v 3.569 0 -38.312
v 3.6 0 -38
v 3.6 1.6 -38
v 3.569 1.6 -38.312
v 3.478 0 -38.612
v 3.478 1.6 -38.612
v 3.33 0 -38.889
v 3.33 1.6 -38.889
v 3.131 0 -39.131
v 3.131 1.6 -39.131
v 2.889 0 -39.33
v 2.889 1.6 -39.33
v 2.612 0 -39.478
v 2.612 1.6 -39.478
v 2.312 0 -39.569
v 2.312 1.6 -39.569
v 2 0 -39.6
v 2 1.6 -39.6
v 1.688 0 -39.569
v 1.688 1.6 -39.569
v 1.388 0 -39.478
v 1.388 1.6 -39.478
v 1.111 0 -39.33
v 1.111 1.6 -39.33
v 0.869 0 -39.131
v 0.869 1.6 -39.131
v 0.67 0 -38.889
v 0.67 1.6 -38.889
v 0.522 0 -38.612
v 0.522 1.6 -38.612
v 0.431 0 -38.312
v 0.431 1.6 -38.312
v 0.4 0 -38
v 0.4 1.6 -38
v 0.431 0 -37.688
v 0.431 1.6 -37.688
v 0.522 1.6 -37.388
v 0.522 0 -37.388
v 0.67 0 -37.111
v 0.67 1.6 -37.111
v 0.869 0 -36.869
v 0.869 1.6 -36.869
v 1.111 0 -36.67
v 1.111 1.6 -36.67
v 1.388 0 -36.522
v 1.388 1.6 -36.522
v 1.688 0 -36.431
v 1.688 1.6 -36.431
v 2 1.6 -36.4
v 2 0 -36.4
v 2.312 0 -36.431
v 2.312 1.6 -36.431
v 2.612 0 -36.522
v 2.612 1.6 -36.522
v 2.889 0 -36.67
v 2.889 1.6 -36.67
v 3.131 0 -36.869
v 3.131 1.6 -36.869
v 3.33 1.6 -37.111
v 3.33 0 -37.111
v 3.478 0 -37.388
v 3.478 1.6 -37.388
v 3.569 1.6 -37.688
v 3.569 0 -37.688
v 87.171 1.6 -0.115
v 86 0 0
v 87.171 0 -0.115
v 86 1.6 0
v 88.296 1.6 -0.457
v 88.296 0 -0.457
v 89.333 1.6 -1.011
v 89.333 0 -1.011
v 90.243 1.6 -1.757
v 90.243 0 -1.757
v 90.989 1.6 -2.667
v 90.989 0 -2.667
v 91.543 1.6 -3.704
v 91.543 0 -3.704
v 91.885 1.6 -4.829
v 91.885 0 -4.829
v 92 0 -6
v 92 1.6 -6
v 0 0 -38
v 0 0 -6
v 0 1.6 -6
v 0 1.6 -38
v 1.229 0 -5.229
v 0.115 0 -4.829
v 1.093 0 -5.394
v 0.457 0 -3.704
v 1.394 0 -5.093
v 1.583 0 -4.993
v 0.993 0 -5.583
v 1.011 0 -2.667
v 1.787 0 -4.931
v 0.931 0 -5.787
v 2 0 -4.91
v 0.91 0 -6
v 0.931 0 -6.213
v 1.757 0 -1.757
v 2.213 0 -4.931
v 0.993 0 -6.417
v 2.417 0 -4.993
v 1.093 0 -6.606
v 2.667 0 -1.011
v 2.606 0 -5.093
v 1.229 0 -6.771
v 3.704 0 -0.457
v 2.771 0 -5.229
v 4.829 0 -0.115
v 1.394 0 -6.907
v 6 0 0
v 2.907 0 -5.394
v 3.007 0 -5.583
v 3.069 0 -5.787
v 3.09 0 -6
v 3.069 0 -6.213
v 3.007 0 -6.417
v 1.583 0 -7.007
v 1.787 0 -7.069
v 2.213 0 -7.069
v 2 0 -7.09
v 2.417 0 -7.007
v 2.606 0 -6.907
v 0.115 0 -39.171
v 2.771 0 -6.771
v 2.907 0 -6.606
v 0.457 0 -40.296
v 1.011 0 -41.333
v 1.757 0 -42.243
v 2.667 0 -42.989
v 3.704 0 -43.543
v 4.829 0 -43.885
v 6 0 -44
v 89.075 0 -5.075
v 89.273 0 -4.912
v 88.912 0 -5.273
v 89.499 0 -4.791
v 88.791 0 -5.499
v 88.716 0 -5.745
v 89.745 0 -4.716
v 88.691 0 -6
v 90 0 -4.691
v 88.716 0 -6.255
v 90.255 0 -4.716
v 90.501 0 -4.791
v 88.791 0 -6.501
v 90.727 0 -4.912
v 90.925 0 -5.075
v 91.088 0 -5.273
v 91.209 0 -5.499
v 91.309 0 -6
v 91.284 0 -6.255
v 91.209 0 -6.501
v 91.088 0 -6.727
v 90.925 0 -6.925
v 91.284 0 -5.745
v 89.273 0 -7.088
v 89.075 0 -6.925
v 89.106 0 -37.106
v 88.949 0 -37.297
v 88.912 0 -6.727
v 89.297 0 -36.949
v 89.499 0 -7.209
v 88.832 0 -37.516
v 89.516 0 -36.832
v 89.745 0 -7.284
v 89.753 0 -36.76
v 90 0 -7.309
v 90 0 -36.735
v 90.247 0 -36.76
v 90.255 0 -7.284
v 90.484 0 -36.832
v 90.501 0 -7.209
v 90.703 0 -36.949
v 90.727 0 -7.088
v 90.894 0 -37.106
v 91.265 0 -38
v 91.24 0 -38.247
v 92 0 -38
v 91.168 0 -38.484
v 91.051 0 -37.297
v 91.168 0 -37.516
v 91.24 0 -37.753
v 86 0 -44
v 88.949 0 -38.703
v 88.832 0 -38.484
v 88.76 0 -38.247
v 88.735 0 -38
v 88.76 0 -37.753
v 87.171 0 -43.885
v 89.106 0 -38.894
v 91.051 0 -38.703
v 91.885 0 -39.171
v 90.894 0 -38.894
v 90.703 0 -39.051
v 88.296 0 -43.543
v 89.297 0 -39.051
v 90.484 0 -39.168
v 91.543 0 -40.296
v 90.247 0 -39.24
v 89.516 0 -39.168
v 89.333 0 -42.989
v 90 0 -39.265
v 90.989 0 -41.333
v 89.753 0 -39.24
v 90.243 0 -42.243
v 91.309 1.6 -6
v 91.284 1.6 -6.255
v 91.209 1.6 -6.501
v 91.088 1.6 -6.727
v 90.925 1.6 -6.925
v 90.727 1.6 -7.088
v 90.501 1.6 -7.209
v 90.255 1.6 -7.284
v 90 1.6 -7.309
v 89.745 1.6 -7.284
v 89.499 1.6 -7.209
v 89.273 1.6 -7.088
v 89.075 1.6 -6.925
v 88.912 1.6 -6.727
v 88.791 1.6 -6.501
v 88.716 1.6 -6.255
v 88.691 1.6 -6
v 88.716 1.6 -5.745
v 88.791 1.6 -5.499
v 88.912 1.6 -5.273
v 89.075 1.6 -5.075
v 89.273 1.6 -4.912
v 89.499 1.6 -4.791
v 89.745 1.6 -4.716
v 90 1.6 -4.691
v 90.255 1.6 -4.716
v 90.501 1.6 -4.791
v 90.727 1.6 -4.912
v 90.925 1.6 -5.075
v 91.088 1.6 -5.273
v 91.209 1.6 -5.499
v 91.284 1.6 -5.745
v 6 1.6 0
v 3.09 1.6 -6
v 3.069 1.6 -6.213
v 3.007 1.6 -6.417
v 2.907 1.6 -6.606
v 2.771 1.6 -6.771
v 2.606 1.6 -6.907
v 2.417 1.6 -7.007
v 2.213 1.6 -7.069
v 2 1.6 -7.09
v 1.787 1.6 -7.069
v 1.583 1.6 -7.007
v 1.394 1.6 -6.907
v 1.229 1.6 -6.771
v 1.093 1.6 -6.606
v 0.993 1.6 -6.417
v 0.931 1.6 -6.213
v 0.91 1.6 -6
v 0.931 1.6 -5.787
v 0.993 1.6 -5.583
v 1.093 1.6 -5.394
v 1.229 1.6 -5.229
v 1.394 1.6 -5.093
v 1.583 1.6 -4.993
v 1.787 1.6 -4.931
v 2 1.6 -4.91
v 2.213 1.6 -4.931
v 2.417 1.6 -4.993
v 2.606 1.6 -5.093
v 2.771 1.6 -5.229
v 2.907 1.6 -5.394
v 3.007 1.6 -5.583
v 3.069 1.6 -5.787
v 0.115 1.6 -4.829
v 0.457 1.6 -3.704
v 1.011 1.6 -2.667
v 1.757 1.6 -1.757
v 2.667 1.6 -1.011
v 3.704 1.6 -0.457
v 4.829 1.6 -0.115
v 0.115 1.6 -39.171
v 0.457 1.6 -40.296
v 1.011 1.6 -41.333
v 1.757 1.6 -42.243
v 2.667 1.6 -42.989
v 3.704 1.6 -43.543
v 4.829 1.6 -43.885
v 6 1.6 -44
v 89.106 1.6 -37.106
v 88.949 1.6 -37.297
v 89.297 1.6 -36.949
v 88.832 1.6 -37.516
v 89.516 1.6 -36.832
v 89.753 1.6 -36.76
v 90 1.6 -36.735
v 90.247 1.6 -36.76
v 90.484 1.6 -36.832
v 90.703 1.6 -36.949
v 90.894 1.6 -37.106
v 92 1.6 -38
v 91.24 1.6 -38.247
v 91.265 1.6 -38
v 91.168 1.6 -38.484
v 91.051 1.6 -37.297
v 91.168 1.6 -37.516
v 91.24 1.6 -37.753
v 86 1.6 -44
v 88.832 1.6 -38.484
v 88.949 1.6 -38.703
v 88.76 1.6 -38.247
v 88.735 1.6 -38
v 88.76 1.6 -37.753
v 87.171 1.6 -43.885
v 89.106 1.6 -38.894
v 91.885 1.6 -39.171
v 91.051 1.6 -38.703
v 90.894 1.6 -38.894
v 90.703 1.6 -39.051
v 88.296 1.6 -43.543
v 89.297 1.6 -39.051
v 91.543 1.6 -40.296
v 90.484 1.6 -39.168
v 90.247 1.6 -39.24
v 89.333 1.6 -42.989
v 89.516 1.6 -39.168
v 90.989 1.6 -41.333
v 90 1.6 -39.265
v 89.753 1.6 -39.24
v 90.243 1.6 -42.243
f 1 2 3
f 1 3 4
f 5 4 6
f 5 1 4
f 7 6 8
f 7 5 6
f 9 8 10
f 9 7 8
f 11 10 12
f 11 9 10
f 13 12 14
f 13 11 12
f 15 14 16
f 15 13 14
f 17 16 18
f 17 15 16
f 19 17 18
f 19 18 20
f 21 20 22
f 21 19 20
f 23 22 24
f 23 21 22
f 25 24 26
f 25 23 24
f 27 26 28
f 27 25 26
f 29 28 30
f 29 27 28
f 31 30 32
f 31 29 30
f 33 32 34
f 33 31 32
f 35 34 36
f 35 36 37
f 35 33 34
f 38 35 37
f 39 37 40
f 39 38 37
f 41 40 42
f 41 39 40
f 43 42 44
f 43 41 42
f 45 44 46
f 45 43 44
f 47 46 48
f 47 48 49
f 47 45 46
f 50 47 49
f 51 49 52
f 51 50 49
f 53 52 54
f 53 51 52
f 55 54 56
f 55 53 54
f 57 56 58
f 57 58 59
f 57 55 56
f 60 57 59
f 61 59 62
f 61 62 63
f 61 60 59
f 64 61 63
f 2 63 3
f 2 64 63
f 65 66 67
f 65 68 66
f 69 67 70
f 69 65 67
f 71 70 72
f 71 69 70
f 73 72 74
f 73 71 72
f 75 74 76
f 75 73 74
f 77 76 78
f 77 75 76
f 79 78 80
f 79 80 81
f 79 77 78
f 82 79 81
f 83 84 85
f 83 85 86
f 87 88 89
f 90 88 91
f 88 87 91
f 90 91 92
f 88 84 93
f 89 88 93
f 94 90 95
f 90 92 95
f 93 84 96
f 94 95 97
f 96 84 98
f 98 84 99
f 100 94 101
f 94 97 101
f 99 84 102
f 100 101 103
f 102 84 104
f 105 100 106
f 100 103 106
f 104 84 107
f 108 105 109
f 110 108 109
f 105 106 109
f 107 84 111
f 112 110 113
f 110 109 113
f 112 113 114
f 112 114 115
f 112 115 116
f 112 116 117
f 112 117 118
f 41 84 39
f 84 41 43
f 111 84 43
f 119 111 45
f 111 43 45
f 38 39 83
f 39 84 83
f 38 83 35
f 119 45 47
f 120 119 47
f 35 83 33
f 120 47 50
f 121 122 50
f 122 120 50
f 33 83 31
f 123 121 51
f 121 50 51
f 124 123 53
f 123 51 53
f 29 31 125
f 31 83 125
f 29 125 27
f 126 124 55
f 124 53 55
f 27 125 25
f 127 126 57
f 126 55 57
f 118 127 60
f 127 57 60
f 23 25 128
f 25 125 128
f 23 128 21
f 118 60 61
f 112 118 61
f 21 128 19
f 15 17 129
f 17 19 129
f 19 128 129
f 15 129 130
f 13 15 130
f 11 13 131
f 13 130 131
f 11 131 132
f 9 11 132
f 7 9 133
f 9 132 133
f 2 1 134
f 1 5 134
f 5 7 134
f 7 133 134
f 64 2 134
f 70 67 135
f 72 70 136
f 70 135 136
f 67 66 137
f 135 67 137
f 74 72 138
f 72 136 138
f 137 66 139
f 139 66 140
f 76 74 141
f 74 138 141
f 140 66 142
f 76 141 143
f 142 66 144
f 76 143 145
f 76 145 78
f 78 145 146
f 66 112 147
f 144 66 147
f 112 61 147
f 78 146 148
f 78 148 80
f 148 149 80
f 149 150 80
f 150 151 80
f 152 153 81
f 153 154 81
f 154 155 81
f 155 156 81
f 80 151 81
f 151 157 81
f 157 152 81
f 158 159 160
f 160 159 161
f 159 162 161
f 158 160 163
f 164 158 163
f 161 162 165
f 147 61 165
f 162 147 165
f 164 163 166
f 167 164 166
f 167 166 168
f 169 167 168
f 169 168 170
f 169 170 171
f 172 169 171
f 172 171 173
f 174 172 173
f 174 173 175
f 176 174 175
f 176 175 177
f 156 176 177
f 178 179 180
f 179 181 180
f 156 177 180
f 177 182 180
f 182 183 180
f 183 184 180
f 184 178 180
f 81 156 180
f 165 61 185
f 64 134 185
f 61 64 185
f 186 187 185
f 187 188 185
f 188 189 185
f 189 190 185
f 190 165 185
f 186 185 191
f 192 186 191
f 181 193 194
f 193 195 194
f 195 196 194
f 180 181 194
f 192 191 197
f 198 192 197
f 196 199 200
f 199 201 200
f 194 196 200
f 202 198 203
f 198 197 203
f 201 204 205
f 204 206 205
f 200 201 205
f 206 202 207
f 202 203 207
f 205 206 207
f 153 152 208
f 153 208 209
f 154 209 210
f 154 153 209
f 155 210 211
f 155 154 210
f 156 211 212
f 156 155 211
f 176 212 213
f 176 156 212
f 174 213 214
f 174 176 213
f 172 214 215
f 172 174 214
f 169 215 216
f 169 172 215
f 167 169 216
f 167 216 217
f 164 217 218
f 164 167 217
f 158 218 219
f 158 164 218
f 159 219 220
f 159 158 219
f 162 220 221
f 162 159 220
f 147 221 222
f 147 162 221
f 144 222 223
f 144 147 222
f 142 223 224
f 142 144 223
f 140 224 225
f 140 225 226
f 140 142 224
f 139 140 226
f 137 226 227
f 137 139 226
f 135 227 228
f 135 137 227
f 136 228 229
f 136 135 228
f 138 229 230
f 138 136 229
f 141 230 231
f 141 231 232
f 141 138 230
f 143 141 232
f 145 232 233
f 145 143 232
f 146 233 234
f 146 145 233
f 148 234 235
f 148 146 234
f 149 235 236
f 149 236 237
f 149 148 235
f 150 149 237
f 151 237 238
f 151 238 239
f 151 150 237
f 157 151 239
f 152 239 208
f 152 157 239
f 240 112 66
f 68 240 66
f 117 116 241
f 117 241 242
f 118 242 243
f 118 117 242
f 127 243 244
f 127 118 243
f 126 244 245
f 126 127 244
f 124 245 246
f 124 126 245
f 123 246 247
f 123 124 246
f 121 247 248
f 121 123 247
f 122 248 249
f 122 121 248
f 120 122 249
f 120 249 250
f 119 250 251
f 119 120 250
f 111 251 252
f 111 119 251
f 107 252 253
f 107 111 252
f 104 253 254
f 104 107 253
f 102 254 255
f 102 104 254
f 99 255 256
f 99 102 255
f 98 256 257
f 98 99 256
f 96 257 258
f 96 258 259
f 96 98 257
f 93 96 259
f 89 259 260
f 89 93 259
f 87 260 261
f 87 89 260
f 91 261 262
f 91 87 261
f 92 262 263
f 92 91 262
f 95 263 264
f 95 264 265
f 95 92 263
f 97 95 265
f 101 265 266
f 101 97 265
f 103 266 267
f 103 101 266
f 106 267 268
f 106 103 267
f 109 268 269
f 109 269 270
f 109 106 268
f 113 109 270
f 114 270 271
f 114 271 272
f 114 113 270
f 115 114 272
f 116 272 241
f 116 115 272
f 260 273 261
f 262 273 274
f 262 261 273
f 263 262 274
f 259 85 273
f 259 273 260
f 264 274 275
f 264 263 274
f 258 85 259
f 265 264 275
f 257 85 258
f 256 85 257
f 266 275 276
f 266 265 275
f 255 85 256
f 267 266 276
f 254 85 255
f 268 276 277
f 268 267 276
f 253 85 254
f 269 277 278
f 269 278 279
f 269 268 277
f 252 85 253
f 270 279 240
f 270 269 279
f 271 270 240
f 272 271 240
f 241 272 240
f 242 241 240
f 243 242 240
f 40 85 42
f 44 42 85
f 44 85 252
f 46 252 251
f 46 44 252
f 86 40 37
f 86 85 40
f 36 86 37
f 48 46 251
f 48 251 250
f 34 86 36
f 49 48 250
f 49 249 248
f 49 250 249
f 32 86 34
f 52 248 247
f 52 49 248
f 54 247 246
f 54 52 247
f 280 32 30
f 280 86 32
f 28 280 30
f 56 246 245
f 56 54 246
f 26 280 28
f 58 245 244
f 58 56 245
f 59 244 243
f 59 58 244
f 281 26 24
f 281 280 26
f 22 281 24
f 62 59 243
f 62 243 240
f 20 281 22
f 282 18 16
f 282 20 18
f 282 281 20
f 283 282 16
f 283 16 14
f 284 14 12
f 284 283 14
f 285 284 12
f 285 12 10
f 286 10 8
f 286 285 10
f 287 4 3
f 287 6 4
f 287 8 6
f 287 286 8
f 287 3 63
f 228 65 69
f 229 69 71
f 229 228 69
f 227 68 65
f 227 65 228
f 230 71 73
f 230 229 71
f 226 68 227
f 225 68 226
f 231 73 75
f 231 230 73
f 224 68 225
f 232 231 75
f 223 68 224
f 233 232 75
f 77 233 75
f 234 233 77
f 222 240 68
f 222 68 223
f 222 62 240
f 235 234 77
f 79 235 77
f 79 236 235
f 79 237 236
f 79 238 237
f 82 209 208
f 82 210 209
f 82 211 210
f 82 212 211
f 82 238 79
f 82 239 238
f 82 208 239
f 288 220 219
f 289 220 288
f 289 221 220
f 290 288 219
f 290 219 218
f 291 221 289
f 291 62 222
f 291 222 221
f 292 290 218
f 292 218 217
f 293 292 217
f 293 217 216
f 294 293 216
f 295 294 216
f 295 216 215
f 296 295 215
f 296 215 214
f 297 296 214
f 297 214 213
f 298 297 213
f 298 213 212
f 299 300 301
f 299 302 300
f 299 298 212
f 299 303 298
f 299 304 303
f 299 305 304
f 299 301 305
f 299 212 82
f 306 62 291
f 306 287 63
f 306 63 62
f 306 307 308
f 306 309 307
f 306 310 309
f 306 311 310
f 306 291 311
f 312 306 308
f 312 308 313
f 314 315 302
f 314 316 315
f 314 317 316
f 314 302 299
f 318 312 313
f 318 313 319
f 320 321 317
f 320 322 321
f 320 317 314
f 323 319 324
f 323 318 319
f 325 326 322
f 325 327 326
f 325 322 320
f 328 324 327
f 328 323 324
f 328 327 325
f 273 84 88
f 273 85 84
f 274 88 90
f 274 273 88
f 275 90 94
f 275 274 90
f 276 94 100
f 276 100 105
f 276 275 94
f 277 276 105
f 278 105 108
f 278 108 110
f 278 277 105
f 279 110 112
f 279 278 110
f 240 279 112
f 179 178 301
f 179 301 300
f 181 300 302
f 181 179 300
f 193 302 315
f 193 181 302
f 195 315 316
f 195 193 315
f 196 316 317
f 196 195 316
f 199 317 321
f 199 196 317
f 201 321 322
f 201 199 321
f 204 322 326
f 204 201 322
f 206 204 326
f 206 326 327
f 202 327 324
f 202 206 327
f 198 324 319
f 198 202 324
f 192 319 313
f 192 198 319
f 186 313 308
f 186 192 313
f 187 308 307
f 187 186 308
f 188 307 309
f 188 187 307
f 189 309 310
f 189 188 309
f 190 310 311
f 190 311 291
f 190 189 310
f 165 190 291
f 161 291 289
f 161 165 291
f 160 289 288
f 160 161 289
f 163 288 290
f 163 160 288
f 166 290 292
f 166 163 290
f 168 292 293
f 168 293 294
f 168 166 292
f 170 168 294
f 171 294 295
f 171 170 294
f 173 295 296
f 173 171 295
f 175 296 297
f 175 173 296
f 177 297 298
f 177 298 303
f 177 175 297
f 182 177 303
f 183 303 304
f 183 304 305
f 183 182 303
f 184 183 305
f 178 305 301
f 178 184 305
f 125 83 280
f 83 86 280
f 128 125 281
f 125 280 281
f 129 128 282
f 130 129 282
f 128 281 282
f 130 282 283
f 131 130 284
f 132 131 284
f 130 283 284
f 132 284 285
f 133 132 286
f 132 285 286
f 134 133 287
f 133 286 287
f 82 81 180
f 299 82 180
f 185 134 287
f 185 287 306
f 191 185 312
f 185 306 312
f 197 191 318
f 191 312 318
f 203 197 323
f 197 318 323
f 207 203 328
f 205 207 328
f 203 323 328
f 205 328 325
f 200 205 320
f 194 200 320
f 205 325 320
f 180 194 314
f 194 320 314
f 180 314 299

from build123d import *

# Parameters (mm, degrees)
SKETCH1_W           = 92
SKETCH1_H           = 44
SKETCH1_R           = 1.090391873
SKETCH1_R_2         = 1.6
SKETCH1_R_3         = 1.26453084
SKETCH1_R_4         = 1.308726881
BOSS_EXTRUDE1_DEPTH = 1.6
FILLET1_R           = 6


with BuildPart() as part:
    # Sketch1 → Boss-Extrude1 (new body)
    with BuildSketch(Plane(origin=(0, 0, 0), x_dir=(1, 0, 0), z_dir=(0, 1, 0))):
        with Locations((46, 22)):
            Rectangle(SKETCH1_W, SKETCH1_H)
        with Locations((2, 6)):
            Circle(SKETCH1_R, mode=Mode.SUBTRACT)
        with Locations((2, 38)):
            Circle(SKETCH1_R_2, mode=Mode.SUBTRACT)
        with Locations((90, 38)):
            Circle(SKETCH1_R_3, mode=Mode.SUBTRACT)
        with Locations((90, 6)):
            Circle(SKETCH1_R_4, mode=Mode.SUBTRACT)
    extrude(amount=BOSS_EXTRUDE1_DEPTH)

    # Fillet1
    fillet1_edges = [part.edges().sort_by_distance(p)[0] for p in [
        (0, 0.8, -44),
        (92, 0.8, -44),
        (92, 0.8, 0),
        (0, 0.8, 0),
    ]]
    fillet(fillet1_edges, radius=FILLET1_R)


solid = part.part
